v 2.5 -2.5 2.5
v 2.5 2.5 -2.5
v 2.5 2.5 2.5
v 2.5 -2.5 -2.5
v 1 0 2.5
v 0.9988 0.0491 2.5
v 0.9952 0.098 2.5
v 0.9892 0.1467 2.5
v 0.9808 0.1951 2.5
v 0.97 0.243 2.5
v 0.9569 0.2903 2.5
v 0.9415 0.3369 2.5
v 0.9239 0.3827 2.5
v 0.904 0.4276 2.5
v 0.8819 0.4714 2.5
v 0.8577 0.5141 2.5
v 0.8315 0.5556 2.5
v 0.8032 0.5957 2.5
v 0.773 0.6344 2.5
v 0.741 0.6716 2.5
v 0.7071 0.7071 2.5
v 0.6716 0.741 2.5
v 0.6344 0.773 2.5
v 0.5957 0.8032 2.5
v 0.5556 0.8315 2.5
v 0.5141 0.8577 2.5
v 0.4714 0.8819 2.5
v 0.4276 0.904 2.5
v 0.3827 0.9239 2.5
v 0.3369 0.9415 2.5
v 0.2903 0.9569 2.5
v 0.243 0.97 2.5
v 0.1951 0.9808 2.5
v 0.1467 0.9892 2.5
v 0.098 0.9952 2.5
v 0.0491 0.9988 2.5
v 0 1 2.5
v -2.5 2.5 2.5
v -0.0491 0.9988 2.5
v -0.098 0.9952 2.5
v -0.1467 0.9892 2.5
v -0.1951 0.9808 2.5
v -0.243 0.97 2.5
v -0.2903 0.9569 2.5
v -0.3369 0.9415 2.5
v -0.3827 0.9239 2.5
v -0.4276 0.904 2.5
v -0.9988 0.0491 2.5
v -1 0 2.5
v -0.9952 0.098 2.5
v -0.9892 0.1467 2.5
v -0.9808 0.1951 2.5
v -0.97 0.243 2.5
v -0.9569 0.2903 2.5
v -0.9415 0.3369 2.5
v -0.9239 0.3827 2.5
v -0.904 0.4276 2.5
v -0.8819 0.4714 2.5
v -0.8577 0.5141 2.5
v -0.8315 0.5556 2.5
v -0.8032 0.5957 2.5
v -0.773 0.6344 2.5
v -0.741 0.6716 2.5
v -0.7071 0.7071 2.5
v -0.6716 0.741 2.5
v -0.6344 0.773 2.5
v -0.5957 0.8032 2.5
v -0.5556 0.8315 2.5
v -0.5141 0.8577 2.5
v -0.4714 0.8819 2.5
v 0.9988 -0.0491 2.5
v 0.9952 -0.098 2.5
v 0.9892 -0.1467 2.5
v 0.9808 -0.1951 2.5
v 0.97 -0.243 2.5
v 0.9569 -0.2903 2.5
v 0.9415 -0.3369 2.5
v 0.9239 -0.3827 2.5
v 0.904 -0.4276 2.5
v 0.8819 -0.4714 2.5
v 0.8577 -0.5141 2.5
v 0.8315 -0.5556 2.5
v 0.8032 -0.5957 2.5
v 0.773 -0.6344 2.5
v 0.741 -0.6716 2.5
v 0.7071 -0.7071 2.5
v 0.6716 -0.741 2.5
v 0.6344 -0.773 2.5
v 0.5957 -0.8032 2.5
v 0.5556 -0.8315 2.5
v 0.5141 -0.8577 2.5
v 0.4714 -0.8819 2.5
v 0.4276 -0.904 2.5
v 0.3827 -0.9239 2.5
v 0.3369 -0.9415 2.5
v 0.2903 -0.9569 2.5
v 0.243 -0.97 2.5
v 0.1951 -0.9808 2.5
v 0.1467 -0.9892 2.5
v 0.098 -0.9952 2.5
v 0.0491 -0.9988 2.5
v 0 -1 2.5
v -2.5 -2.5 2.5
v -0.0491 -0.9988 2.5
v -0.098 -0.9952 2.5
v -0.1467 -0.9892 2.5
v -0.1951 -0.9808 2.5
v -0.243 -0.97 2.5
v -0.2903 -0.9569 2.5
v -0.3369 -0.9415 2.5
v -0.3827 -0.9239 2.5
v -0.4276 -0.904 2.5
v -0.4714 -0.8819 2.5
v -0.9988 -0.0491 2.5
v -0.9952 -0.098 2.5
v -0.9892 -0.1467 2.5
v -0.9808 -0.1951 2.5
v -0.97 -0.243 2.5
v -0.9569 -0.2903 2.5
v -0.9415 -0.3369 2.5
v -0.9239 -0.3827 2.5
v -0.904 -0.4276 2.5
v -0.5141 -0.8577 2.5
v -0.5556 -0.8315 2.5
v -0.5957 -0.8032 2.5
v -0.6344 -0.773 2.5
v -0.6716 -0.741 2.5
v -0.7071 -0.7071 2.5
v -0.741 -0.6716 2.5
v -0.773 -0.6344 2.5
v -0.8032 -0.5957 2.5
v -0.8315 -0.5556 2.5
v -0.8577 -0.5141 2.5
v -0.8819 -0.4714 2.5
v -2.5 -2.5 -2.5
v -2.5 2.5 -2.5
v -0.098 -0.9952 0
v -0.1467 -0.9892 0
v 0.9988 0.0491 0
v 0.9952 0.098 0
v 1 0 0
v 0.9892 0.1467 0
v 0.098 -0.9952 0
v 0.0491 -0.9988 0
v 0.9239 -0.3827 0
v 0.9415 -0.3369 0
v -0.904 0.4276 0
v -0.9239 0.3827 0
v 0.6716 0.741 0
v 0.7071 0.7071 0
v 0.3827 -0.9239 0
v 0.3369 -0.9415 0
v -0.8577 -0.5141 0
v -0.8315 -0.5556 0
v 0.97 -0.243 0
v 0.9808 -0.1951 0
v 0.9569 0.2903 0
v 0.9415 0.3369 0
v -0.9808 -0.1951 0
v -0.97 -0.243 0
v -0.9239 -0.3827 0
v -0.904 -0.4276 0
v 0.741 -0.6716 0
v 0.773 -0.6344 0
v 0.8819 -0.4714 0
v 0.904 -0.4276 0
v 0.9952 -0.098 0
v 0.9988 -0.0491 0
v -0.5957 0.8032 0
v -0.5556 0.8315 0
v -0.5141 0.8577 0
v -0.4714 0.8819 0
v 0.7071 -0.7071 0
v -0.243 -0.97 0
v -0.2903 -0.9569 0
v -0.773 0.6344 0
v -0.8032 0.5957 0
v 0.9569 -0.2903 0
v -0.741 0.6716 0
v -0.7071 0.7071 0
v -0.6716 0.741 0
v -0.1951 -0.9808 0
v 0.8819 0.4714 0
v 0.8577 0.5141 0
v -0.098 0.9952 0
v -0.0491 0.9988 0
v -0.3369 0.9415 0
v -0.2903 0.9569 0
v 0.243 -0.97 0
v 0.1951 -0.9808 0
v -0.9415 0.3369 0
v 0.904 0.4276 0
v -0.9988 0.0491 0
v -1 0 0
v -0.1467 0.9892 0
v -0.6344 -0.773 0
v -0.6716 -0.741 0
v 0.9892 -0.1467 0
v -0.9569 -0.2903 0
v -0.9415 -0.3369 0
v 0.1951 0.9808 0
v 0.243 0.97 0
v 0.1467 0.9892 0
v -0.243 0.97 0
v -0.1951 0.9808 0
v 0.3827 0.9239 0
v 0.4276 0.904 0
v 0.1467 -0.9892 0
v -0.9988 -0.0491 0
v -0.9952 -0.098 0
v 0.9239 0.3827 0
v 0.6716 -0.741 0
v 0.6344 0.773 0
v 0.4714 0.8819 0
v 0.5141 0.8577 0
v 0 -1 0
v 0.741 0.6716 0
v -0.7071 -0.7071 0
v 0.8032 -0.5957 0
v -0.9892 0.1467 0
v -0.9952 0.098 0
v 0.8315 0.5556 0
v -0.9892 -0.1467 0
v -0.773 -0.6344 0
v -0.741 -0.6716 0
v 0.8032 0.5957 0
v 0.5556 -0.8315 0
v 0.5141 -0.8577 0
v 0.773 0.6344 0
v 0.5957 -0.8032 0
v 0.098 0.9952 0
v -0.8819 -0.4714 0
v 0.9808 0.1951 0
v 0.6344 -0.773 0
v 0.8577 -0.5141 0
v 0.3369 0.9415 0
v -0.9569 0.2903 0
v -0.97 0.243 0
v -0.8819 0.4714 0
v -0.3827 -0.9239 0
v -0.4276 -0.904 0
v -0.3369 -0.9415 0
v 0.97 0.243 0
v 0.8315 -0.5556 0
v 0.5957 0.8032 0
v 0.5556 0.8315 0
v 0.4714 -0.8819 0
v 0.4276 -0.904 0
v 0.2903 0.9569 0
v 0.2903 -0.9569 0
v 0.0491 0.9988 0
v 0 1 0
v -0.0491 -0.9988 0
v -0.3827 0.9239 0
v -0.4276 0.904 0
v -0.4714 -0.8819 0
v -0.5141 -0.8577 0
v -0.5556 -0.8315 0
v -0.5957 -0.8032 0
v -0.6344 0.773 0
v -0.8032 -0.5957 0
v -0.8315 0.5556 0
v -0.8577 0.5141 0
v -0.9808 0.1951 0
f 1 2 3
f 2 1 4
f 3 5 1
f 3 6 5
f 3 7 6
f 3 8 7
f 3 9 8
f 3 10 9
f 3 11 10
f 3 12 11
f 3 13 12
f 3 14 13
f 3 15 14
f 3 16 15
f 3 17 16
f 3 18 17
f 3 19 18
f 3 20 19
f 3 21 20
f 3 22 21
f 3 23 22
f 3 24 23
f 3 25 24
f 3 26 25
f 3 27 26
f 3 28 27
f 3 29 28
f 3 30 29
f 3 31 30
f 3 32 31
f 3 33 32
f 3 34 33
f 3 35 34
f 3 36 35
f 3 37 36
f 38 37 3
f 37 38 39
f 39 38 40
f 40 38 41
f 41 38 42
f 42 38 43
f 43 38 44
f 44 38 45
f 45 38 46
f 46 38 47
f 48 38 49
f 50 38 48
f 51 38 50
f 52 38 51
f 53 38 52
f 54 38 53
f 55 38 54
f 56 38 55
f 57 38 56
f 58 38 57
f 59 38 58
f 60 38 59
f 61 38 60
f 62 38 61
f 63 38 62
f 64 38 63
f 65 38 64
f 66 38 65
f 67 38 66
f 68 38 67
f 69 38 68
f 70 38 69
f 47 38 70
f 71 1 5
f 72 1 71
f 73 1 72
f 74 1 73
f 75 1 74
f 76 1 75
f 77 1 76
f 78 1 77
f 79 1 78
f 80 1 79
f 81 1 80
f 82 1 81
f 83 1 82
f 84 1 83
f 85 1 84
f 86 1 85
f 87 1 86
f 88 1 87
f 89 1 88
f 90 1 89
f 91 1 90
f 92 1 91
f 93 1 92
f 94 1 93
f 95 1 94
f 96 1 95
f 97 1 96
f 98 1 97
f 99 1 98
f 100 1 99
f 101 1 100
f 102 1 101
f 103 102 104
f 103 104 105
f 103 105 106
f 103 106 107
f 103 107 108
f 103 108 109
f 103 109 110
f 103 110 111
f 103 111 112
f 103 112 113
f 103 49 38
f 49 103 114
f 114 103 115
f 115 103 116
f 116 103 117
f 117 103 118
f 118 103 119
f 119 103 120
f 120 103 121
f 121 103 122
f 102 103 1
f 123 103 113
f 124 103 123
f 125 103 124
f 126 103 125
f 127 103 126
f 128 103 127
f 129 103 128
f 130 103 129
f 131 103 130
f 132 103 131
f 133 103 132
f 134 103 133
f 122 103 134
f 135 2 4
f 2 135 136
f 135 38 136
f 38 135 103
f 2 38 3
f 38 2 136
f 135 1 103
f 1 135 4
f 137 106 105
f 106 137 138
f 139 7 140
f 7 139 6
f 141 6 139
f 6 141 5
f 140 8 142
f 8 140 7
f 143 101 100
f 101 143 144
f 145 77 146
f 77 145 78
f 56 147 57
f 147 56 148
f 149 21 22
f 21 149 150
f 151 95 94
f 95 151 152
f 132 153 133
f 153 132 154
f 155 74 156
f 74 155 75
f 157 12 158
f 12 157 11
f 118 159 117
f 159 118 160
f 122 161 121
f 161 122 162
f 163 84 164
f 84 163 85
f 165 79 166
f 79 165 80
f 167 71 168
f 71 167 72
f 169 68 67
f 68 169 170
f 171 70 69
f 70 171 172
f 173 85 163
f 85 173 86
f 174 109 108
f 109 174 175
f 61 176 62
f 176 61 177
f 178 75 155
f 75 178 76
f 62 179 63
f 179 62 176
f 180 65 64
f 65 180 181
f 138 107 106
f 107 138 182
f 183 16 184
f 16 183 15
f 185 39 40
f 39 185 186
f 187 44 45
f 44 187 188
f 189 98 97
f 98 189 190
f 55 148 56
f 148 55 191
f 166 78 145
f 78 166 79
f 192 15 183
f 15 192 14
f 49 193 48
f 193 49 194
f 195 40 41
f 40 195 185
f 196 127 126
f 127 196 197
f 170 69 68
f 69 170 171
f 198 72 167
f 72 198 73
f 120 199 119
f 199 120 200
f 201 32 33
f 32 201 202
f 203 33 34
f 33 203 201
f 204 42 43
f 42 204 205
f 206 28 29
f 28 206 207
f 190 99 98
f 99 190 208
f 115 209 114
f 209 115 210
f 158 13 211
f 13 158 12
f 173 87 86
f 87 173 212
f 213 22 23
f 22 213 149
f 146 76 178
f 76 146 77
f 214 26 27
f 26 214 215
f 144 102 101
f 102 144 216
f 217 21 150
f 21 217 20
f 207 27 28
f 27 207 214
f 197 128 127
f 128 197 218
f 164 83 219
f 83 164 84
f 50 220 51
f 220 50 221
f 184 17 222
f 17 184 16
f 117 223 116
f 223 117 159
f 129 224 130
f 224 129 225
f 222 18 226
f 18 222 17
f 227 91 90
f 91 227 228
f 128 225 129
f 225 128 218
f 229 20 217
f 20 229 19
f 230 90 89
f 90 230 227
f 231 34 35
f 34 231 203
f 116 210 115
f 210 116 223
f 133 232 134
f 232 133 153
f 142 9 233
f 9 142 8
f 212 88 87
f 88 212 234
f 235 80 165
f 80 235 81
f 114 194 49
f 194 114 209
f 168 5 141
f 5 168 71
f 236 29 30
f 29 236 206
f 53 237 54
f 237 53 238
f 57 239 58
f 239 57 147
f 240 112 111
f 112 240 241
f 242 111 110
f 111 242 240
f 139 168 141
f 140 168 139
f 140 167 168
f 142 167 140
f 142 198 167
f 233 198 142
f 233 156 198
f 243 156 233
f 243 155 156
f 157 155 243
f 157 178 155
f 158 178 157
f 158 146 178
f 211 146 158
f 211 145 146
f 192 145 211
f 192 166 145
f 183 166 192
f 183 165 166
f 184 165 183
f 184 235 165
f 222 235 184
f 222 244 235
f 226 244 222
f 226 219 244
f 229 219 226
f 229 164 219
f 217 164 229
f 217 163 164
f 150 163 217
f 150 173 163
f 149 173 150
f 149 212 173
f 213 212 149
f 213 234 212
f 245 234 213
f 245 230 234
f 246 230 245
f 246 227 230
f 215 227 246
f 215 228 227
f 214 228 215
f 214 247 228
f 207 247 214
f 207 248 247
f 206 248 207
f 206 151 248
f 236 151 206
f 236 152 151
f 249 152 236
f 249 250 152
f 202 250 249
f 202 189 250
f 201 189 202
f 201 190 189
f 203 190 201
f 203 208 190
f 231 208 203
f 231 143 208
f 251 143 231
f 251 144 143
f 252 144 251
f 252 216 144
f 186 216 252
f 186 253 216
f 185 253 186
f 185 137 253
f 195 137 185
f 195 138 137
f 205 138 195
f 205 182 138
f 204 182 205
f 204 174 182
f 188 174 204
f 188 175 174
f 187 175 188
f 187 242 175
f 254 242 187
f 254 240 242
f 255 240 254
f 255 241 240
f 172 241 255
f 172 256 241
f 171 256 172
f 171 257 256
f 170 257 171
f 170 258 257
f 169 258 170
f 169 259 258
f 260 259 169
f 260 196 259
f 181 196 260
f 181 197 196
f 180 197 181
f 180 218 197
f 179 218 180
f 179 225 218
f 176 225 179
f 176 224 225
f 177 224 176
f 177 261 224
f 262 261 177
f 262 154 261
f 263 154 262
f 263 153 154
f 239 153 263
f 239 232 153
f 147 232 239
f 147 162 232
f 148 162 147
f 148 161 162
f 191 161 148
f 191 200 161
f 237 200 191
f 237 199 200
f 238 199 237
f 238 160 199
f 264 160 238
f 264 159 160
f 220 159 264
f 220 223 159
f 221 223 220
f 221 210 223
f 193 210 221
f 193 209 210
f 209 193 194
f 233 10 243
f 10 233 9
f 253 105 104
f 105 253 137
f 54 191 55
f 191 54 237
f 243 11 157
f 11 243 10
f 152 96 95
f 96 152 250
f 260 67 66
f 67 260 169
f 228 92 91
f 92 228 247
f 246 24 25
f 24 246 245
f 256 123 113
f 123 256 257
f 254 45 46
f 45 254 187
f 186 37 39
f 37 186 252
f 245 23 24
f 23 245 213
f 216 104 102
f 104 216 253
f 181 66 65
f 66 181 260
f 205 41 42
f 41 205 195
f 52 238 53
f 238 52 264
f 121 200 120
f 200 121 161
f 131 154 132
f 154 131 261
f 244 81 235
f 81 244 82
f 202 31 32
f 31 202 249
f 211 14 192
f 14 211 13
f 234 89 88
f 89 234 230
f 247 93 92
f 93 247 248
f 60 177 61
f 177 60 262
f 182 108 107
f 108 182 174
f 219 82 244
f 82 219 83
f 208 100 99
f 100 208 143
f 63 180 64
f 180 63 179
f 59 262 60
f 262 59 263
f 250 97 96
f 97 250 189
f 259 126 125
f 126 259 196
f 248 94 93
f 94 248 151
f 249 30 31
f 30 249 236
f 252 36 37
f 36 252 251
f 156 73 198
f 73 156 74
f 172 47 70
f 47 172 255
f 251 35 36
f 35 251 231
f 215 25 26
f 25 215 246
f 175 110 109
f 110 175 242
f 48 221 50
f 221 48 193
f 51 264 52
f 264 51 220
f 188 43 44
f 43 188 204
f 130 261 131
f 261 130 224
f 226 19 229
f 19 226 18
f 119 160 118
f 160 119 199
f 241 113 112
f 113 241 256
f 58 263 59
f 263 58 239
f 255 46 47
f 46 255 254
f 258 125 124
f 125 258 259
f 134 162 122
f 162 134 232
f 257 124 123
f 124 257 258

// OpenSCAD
$fn = 128;

difference() {
    cube(5,5,5, center=true);

    union() {
//        cube([2,2,10], center = true);
//        rotate(a=45) {
  //          cube([2,2,10], center = true);
    //    }
        cylinder(r=1,h=10);
    }
}


/*
 triangle_points =[[0,0],[100,0],[0,100],[10,10],[80,10],[10,80]];
 triangle_paths =[[0,1,2],[3,4,5]];
 polygon(triangle_points,triangle_paths,10);
 */
